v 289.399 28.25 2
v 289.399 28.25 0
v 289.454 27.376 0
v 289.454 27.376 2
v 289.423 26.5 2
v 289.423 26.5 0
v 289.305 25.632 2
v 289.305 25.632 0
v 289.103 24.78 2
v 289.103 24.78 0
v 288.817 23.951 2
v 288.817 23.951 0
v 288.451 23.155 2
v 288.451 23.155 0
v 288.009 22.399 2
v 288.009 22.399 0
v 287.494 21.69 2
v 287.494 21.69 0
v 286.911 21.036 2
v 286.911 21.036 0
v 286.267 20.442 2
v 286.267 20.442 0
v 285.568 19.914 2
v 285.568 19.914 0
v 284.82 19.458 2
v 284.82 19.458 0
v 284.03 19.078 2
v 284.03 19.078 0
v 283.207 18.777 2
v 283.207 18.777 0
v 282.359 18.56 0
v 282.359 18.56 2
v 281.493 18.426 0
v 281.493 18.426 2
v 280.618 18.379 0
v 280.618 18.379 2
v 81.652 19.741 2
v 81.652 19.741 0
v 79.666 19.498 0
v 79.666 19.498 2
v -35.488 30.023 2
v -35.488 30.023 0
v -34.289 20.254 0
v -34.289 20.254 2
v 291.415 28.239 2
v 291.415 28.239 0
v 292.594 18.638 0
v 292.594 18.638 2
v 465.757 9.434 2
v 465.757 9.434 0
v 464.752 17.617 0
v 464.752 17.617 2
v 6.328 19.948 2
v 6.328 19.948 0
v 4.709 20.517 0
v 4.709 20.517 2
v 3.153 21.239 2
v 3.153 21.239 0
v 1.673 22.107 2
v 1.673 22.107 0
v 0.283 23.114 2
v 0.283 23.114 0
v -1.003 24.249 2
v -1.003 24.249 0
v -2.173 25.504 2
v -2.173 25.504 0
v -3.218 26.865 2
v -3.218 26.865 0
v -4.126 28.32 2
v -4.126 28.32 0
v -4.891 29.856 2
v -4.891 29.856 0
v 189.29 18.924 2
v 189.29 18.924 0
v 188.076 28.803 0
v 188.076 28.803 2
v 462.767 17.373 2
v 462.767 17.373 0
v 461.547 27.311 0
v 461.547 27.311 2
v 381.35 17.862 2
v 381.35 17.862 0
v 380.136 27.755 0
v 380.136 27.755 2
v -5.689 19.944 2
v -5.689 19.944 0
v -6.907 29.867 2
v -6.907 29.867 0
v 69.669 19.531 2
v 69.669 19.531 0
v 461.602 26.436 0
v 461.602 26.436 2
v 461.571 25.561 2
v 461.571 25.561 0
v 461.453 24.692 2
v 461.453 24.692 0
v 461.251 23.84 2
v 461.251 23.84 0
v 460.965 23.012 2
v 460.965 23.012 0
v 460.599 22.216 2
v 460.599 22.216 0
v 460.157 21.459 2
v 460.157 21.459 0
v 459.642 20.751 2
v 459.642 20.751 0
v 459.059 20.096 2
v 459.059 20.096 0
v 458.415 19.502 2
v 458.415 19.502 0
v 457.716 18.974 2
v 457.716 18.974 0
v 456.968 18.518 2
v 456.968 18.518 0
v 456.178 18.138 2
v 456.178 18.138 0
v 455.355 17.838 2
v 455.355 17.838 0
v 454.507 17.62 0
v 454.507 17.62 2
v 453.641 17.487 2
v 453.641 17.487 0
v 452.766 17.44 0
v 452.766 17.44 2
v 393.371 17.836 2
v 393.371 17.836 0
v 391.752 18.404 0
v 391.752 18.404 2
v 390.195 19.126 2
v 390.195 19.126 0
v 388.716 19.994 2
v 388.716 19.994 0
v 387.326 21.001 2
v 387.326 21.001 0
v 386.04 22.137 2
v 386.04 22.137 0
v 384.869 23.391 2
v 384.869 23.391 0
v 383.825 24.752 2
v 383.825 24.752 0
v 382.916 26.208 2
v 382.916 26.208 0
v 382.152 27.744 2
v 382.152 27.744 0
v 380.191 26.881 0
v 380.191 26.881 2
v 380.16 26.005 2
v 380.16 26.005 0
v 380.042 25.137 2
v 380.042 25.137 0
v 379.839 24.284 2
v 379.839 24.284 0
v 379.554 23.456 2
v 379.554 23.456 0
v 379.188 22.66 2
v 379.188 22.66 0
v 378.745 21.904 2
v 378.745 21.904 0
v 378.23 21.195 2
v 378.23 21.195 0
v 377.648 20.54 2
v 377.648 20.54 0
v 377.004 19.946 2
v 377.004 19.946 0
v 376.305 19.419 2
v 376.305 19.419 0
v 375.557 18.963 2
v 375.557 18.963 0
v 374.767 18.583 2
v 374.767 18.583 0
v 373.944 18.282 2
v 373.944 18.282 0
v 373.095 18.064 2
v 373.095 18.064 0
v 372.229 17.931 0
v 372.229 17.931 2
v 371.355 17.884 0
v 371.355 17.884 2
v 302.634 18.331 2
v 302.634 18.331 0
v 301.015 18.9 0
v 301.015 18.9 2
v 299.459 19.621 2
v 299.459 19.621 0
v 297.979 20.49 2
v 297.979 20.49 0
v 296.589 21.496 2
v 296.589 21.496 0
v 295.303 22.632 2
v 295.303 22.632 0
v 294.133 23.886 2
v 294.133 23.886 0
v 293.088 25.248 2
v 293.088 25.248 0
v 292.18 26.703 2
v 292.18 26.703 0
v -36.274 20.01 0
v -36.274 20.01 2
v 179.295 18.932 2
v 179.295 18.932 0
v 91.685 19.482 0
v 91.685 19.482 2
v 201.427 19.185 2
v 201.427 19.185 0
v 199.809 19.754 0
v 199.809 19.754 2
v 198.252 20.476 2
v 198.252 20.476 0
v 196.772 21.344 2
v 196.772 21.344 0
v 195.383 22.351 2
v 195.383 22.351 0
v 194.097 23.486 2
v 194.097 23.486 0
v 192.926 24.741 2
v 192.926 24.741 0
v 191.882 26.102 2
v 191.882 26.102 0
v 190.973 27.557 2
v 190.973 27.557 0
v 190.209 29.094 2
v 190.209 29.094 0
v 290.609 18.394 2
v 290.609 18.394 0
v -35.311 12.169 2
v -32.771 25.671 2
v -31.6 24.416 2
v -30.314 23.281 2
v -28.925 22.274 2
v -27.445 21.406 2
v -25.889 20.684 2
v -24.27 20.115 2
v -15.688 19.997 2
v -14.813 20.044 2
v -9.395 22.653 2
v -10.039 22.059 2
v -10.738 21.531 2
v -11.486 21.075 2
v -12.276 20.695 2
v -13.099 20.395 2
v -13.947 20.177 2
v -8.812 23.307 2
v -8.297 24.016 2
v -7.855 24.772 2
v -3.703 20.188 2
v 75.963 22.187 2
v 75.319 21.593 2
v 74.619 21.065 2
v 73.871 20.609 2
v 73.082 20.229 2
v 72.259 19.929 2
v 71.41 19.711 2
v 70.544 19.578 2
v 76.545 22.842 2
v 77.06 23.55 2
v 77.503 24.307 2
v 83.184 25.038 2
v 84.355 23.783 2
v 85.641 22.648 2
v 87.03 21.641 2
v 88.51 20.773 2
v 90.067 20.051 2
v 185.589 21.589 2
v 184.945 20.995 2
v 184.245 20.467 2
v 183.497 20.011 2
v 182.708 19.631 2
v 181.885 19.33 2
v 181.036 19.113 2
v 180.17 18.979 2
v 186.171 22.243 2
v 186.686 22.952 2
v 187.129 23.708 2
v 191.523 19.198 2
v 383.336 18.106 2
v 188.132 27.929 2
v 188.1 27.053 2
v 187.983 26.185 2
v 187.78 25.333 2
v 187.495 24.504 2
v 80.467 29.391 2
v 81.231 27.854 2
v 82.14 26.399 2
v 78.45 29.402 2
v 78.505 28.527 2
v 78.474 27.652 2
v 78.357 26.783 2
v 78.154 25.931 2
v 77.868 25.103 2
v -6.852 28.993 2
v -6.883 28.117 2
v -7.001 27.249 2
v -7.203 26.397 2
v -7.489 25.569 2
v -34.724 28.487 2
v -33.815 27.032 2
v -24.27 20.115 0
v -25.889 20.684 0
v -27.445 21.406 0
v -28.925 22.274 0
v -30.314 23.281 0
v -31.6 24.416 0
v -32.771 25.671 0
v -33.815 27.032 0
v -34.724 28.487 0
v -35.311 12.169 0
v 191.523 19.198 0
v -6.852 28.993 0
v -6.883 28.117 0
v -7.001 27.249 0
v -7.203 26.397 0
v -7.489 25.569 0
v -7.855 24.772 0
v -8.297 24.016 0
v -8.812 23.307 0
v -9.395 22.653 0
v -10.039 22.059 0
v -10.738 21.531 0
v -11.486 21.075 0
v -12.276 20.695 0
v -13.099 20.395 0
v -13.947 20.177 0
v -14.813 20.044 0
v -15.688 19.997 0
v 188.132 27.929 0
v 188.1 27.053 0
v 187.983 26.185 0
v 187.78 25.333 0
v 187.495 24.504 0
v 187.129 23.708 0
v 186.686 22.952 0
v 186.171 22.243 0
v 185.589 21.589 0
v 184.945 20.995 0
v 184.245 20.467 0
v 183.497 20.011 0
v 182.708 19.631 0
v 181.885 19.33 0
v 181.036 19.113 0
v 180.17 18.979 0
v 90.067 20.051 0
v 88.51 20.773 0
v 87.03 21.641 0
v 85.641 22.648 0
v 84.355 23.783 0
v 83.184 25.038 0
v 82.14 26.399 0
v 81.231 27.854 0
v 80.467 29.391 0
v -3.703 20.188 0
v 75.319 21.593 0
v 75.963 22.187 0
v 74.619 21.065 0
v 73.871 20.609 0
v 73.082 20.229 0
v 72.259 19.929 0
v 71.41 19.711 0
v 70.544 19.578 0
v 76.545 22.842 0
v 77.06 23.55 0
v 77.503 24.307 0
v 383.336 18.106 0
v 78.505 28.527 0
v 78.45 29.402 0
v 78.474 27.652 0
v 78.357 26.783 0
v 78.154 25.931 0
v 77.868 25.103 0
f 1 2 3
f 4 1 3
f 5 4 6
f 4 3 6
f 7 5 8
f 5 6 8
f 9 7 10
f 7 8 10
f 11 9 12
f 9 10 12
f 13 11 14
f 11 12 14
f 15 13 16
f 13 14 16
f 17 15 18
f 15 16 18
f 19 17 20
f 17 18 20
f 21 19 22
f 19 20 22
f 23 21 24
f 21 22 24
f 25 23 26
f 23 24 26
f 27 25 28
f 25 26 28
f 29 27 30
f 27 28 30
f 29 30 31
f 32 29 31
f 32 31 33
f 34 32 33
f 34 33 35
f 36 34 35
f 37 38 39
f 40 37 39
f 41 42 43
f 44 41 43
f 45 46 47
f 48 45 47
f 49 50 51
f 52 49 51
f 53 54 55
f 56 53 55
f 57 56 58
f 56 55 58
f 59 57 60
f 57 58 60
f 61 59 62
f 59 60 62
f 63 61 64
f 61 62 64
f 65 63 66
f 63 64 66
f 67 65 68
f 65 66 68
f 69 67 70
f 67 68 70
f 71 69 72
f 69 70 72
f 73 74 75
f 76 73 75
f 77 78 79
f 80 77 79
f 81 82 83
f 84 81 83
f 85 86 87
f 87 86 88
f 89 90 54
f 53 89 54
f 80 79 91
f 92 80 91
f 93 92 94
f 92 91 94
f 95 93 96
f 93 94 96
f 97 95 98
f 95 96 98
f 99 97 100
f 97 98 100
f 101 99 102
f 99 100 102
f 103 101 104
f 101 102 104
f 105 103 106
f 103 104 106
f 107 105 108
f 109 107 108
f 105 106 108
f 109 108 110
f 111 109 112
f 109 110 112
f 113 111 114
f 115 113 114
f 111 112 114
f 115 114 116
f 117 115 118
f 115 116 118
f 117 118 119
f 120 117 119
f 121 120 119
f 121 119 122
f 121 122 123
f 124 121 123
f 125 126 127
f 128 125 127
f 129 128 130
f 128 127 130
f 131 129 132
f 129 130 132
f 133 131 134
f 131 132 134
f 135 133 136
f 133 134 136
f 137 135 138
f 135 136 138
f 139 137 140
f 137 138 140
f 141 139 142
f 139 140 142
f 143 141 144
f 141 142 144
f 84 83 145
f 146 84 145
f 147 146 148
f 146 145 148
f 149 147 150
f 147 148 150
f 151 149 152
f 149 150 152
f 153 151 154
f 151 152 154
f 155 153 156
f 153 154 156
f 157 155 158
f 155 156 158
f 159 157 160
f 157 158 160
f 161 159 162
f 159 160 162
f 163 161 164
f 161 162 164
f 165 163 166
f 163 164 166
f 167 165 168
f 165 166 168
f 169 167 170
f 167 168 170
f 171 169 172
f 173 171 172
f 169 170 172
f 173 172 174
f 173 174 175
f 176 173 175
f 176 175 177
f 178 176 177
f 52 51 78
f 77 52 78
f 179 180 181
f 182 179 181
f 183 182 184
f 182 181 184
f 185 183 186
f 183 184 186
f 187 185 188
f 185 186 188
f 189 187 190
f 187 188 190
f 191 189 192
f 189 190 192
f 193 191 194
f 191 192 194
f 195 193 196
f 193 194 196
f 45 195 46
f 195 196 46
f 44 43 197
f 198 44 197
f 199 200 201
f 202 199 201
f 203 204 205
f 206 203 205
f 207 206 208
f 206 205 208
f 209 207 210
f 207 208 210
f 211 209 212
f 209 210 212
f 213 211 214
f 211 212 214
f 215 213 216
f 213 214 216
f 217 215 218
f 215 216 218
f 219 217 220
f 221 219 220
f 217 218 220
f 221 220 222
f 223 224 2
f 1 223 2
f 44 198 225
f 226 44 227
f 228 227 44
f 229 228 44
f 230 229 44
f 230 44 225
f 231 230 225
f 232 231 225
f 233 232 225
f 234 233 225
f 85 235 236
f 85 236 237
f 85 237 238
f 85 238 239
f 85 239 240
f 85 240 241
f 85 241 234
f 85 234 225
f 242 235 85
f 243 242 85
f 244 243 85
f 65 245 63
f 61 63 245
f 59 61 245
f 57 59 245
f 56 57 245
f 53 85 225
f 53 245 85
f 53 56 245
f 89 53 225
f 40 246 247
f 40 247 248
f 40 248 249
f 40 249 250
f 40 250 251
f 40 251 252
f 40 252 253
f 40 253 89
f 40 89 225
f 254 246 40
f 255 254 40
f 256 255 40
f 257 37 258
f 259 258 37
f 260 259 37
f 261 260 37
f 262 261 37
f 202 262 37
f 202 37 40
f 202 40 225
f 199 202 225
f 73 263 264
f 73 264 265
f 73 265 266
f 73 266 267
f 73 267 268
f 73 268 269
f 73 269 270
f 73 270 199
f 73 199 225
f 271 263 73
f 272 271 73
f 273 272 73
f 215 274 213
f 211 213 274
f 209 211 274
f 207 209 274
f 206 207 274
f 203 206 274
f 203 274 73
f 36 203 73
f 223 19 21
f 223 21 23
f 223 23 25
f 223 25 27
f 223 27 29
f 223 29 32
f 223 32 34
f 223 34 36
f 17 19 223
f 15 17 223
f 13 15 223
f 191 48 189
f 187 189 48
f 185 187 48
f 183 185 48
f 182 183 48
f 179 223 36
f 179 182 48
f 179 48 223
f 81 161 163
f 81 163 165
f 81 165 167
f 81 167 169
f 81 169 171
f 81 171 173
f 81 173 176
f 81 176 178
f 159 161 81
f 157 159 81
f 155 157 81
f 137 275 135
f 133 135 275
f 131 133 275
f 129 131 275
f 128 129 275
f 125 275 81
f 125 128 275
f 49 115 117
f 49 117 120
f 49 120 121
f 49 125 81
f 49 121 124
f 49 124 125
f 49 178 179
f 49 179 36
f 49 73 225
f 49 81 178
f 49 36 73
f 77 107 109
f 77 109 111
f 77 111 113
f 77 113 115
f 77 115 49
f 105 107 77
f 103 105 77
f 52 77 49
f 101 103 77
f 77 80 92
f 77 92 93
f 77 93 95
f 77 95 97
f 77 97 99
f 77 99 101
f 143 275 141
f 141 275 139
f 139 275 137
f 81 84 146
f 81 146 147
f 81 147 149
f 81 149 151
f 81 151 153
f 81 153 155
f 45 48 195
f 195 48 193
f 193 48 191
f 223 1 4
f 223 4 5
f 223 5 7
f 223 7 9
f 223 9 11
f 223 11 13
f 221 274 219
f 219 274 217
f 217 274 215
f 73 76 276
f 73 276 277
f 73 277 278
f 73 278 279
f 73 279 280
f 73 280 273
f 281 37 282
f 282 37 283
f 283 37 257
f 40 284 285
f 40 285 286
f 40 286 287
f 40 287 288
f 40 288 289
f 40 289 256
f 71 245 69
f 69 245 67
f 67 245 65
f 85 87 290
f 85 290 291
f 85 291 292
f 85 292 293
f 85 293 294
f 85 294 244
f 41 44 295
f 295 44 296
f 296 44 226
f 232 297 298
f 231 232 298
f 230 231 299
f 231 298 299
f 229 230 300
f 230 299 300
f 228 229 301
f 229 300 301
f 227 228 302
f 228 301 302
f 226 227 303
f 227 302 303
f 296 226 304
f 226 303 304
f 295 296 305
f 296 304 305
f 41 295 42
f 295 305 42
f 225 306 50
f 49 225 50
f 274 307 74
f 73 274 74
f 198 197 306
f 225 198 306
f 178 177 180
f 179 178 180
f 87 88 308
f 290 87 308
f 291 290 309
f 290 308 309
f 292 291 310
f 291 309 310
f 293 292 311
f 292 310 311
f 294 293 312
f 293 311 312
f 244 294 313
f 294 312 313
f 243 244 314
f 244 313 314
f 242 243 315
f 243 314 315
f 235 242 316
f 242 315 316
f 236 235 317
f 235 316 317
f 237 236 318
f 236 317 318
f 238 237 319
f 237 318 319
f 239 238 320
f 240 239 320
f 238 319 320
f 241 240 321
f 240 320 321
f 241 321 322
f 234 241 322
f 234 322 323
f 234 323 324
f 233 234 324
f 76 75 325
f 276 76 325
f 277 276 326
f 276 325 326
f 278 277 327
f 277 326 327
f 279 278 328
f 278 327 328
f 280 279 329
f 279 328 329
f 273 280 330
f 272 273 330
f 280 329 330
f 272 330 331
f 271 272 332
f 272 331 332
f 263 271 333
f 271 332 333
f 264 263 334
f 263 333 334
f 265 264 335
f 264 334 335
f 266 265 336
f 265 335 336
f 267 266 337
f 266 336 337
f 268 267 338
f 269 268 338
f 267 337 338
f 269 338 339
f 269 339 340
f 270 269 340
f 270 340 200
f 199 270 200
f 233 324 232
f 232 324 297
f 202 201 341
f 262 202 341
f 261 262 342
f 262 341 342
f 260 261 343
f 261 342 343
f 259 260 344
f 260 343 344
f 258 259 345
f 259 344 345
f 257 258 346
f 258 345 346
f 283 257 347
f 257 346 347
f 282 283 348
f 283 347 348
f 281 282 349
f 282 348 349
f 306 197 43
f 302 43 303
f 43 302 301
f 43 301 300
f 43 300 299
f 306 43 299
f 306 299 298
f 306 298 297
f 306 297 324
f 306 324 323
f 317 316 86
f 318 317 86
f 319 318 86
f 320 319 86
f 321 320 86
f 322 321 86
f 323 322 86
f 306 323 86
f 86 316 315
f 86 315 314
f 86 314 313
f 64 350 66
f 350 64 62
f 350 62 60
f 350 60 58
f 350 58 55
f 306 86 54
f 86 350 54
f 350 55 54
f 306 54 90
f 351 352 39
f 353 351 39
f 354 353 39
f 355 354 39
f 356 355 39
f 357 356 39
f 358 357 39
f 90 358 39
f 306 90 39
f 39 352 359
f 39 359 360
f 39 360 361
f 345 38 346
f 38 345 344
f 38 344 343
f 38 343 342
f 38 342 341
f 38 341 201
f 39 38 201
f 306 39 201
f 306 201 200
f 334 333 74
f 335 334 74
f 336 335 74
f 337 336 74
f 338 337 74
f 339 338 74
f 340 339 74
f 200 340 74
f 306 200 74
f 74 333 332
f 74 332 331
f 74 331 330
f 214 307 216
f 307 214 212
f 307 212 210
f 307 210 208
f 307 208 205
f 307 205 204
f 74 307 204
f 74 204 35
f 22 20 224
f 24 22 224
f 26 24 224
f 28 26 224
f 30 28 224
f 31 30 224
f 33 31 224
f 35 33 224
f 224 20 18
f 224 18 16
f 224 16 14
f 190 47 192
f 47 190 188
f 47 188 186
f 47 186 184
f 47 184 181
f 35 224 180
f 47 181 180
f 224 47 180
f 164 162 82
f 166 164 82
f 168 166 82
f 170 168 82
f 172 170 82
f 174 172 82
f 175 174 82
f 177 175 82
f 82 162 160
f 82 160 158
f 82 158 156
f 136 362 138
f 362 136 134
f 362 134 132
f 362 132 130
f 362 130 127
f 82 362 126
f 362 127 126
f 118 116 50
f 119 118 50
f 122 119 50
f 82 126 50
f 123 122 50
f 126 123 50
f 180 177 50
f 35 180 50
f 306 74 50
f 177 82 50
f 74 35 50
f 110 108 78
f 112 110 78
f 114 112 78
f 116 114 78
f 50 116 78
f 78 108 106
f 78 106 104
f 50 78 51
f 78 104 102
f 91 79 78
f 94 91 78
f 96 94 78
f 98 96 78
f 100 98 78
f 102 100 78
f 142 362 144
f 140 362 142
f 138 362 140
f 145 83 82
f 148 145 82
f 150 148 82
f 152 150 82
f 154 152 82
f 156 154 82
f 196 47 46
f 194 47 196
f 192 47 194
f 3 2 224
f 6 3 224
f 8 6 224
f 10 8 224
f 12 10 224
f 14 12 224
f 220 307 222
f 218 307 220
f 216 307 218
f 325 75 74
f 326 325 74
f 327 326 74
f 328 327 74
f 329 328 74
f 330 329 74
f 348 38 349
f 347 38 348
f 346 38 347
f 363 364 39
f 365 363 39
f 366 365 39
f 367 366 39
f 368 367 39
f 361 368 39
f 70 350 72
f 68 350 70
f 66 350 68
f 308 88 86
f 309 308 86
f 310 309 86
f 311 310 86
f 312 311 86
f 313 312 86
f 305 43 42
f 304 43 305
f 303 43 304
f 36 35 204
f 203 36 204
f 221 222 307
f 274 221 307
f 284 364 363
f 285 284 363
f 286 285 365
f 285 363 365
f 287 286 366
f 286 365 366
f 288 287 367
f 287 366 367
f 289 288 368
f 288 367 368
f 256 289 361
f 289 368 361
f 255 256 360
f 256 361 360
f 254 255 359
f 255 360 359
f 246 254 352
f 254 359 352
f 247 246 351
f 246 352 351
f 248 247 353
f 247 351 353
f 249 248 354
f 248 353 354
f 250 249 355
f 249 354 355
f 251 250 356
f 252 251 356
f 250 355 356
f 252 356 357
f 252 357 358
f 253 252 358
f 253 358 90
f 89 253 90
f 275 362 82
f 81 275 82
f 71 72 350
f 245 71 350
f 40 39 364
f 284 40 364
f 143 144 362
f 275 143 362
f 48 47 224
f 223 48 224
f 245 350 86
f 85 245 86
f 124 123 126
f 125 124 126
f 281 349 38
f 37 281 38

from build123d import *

# Parameters (mm, degrees)
EXTRUDE_1_DEPTH = 2


with BuildPart() as part:
    # Model → 凸台-拉伸1 (new body)
    with BuildSketch(Plane.XY):
        with BuildLine():
            Line((-35.311080617, 12.168656155), (465.757096498, 9.433834614))
            Line((465.757096498, 9.433834614), (464.752347114, 17.616861673))
            Line((464.752347114, 17.616861673), (462.76725481, 17.373122986))
            Line((462.76725481, 17.373122986), (461.547077382, 27.310670661))
            ThreePointArc((461.547077382, 27.310670661), (459.358669596, 20.416173483), (452.765919761, 17.439788161))
            Line((452.765919761, 17.439788161), (393.370792837, 17.835693957))
            ThreePointArc((393.370792837, 17.835693957), (386.669478588, 21.553462885), (382.152114107, 27.744007013))
            Line((382.152114107, 27.744007013), (383.335527601, 18.105877549))
            Line((383.335527601, 18.105877549), (381.350435298, 17.862138863))
            Line((381.350435298, 17.862138863), (380.135743173, 27.755012331))
            ThreePointArc((380.135743173, 27.755012331), (377.947335387, 20.860515153), (371.354585551, 17.884129831))
            Line((371.354585551, 17.884129831), (302.634100804, 18.330933271))
            ThreePointArc((302.634100804, 18.330933271), (295.932786555, 22.048702198), (291.415422074, 28.239246326))
            Line((291.415422074, 28.239246326), (292.594356772, 18.637593727))
            Line((292.594356772, 18.637593727), (290.609264469, 18.39385504))
            Line((290.609264469, 18.39385504), (289.39905114, 28.250251644))
            ThreePointArc((289.39905114, 28.250251644), (287.210643354, 21.355754466), (280.617893518, 18.379369144))
            Line((280.617893518, 18.379369144), (201.427401733, 19.185275472))
            ThreePointArc((201.427401733, 19.185275472), (194.726087484, 22.903044399), (190.208723003, 29.093588528))
            Line((190.208723003, 29.093588528), (191.522738388, 19.198231962))
            Line((191.522738388, 19.198231962), (189.289509547, 18.924025939))
            Line((189.289509547, 18.924025939), (188.076491094, 28.803268444))
            ThreePointArc((188.076491094, 28.803268444), (185.888083308, 21.908771266), (179.295333472, 18.932385944))
            Line((179.295333472, 18.932385944), (91.685409222, 19.482287621))
            ThreePointArc((91.685409222, 19.482287621), (84.984094973, 23.200056549), (80.466730491, 29.390600677))
            Line((80.466730491, 29.390600677), (81.651505322, 19.741384012))
            Line((81.651505322, 19.741384012), (79.666413019, 19.497645325))
            Line((79.666413019, 19.497645325), (78.450359557, 29.401605995))
            ThreePointArc((78.450359557, 29.401605995), (76.261951771, 22.507108817), (69.669201936, 19.530723495))
            Line((69.669201936, 19.530723495), (6.328074304, 19.948166495))
            ThreePointArc((6.328074304, 19.948166495), (-0.373239945, 23.665935423), (-4.890604427, 29.856479551))
            Line((-4.890604427, 29.856479551), (-3.70346647, 20.188016775))
            Line((-3.70346647, 20.188016775), (-5.688558774, 19.944278089))
            Line((-5.688558774, 19.944278089), (-6.906975361, 29.867484869))
            ThreePointArc((-6.906975361, 29.867484869), (-9.095383147, 22.972987691), (-15.688132982, 19.996602369))
            Line((-15.688132982, 19.996602369), (-24.269679134, 20.11516851))
            ThreePointArc((-24.269679134, 20.11516851), (-30.970993383, 23.832937438), (-35.488357864, 30.023481566))
            Line((-35.488357864, 30.023481566), (-34.288766793, 20.253596312))
            Line((-34.288766793, 20.253596312), (-36.273859097, 20.009857625))
            Line((-36.273859097, 20.009857625), (-35.311080617, 12.168656155))
        make_face()
    extrude(amount=EXTRUDE_1_DEPTH)


solid = part.part
